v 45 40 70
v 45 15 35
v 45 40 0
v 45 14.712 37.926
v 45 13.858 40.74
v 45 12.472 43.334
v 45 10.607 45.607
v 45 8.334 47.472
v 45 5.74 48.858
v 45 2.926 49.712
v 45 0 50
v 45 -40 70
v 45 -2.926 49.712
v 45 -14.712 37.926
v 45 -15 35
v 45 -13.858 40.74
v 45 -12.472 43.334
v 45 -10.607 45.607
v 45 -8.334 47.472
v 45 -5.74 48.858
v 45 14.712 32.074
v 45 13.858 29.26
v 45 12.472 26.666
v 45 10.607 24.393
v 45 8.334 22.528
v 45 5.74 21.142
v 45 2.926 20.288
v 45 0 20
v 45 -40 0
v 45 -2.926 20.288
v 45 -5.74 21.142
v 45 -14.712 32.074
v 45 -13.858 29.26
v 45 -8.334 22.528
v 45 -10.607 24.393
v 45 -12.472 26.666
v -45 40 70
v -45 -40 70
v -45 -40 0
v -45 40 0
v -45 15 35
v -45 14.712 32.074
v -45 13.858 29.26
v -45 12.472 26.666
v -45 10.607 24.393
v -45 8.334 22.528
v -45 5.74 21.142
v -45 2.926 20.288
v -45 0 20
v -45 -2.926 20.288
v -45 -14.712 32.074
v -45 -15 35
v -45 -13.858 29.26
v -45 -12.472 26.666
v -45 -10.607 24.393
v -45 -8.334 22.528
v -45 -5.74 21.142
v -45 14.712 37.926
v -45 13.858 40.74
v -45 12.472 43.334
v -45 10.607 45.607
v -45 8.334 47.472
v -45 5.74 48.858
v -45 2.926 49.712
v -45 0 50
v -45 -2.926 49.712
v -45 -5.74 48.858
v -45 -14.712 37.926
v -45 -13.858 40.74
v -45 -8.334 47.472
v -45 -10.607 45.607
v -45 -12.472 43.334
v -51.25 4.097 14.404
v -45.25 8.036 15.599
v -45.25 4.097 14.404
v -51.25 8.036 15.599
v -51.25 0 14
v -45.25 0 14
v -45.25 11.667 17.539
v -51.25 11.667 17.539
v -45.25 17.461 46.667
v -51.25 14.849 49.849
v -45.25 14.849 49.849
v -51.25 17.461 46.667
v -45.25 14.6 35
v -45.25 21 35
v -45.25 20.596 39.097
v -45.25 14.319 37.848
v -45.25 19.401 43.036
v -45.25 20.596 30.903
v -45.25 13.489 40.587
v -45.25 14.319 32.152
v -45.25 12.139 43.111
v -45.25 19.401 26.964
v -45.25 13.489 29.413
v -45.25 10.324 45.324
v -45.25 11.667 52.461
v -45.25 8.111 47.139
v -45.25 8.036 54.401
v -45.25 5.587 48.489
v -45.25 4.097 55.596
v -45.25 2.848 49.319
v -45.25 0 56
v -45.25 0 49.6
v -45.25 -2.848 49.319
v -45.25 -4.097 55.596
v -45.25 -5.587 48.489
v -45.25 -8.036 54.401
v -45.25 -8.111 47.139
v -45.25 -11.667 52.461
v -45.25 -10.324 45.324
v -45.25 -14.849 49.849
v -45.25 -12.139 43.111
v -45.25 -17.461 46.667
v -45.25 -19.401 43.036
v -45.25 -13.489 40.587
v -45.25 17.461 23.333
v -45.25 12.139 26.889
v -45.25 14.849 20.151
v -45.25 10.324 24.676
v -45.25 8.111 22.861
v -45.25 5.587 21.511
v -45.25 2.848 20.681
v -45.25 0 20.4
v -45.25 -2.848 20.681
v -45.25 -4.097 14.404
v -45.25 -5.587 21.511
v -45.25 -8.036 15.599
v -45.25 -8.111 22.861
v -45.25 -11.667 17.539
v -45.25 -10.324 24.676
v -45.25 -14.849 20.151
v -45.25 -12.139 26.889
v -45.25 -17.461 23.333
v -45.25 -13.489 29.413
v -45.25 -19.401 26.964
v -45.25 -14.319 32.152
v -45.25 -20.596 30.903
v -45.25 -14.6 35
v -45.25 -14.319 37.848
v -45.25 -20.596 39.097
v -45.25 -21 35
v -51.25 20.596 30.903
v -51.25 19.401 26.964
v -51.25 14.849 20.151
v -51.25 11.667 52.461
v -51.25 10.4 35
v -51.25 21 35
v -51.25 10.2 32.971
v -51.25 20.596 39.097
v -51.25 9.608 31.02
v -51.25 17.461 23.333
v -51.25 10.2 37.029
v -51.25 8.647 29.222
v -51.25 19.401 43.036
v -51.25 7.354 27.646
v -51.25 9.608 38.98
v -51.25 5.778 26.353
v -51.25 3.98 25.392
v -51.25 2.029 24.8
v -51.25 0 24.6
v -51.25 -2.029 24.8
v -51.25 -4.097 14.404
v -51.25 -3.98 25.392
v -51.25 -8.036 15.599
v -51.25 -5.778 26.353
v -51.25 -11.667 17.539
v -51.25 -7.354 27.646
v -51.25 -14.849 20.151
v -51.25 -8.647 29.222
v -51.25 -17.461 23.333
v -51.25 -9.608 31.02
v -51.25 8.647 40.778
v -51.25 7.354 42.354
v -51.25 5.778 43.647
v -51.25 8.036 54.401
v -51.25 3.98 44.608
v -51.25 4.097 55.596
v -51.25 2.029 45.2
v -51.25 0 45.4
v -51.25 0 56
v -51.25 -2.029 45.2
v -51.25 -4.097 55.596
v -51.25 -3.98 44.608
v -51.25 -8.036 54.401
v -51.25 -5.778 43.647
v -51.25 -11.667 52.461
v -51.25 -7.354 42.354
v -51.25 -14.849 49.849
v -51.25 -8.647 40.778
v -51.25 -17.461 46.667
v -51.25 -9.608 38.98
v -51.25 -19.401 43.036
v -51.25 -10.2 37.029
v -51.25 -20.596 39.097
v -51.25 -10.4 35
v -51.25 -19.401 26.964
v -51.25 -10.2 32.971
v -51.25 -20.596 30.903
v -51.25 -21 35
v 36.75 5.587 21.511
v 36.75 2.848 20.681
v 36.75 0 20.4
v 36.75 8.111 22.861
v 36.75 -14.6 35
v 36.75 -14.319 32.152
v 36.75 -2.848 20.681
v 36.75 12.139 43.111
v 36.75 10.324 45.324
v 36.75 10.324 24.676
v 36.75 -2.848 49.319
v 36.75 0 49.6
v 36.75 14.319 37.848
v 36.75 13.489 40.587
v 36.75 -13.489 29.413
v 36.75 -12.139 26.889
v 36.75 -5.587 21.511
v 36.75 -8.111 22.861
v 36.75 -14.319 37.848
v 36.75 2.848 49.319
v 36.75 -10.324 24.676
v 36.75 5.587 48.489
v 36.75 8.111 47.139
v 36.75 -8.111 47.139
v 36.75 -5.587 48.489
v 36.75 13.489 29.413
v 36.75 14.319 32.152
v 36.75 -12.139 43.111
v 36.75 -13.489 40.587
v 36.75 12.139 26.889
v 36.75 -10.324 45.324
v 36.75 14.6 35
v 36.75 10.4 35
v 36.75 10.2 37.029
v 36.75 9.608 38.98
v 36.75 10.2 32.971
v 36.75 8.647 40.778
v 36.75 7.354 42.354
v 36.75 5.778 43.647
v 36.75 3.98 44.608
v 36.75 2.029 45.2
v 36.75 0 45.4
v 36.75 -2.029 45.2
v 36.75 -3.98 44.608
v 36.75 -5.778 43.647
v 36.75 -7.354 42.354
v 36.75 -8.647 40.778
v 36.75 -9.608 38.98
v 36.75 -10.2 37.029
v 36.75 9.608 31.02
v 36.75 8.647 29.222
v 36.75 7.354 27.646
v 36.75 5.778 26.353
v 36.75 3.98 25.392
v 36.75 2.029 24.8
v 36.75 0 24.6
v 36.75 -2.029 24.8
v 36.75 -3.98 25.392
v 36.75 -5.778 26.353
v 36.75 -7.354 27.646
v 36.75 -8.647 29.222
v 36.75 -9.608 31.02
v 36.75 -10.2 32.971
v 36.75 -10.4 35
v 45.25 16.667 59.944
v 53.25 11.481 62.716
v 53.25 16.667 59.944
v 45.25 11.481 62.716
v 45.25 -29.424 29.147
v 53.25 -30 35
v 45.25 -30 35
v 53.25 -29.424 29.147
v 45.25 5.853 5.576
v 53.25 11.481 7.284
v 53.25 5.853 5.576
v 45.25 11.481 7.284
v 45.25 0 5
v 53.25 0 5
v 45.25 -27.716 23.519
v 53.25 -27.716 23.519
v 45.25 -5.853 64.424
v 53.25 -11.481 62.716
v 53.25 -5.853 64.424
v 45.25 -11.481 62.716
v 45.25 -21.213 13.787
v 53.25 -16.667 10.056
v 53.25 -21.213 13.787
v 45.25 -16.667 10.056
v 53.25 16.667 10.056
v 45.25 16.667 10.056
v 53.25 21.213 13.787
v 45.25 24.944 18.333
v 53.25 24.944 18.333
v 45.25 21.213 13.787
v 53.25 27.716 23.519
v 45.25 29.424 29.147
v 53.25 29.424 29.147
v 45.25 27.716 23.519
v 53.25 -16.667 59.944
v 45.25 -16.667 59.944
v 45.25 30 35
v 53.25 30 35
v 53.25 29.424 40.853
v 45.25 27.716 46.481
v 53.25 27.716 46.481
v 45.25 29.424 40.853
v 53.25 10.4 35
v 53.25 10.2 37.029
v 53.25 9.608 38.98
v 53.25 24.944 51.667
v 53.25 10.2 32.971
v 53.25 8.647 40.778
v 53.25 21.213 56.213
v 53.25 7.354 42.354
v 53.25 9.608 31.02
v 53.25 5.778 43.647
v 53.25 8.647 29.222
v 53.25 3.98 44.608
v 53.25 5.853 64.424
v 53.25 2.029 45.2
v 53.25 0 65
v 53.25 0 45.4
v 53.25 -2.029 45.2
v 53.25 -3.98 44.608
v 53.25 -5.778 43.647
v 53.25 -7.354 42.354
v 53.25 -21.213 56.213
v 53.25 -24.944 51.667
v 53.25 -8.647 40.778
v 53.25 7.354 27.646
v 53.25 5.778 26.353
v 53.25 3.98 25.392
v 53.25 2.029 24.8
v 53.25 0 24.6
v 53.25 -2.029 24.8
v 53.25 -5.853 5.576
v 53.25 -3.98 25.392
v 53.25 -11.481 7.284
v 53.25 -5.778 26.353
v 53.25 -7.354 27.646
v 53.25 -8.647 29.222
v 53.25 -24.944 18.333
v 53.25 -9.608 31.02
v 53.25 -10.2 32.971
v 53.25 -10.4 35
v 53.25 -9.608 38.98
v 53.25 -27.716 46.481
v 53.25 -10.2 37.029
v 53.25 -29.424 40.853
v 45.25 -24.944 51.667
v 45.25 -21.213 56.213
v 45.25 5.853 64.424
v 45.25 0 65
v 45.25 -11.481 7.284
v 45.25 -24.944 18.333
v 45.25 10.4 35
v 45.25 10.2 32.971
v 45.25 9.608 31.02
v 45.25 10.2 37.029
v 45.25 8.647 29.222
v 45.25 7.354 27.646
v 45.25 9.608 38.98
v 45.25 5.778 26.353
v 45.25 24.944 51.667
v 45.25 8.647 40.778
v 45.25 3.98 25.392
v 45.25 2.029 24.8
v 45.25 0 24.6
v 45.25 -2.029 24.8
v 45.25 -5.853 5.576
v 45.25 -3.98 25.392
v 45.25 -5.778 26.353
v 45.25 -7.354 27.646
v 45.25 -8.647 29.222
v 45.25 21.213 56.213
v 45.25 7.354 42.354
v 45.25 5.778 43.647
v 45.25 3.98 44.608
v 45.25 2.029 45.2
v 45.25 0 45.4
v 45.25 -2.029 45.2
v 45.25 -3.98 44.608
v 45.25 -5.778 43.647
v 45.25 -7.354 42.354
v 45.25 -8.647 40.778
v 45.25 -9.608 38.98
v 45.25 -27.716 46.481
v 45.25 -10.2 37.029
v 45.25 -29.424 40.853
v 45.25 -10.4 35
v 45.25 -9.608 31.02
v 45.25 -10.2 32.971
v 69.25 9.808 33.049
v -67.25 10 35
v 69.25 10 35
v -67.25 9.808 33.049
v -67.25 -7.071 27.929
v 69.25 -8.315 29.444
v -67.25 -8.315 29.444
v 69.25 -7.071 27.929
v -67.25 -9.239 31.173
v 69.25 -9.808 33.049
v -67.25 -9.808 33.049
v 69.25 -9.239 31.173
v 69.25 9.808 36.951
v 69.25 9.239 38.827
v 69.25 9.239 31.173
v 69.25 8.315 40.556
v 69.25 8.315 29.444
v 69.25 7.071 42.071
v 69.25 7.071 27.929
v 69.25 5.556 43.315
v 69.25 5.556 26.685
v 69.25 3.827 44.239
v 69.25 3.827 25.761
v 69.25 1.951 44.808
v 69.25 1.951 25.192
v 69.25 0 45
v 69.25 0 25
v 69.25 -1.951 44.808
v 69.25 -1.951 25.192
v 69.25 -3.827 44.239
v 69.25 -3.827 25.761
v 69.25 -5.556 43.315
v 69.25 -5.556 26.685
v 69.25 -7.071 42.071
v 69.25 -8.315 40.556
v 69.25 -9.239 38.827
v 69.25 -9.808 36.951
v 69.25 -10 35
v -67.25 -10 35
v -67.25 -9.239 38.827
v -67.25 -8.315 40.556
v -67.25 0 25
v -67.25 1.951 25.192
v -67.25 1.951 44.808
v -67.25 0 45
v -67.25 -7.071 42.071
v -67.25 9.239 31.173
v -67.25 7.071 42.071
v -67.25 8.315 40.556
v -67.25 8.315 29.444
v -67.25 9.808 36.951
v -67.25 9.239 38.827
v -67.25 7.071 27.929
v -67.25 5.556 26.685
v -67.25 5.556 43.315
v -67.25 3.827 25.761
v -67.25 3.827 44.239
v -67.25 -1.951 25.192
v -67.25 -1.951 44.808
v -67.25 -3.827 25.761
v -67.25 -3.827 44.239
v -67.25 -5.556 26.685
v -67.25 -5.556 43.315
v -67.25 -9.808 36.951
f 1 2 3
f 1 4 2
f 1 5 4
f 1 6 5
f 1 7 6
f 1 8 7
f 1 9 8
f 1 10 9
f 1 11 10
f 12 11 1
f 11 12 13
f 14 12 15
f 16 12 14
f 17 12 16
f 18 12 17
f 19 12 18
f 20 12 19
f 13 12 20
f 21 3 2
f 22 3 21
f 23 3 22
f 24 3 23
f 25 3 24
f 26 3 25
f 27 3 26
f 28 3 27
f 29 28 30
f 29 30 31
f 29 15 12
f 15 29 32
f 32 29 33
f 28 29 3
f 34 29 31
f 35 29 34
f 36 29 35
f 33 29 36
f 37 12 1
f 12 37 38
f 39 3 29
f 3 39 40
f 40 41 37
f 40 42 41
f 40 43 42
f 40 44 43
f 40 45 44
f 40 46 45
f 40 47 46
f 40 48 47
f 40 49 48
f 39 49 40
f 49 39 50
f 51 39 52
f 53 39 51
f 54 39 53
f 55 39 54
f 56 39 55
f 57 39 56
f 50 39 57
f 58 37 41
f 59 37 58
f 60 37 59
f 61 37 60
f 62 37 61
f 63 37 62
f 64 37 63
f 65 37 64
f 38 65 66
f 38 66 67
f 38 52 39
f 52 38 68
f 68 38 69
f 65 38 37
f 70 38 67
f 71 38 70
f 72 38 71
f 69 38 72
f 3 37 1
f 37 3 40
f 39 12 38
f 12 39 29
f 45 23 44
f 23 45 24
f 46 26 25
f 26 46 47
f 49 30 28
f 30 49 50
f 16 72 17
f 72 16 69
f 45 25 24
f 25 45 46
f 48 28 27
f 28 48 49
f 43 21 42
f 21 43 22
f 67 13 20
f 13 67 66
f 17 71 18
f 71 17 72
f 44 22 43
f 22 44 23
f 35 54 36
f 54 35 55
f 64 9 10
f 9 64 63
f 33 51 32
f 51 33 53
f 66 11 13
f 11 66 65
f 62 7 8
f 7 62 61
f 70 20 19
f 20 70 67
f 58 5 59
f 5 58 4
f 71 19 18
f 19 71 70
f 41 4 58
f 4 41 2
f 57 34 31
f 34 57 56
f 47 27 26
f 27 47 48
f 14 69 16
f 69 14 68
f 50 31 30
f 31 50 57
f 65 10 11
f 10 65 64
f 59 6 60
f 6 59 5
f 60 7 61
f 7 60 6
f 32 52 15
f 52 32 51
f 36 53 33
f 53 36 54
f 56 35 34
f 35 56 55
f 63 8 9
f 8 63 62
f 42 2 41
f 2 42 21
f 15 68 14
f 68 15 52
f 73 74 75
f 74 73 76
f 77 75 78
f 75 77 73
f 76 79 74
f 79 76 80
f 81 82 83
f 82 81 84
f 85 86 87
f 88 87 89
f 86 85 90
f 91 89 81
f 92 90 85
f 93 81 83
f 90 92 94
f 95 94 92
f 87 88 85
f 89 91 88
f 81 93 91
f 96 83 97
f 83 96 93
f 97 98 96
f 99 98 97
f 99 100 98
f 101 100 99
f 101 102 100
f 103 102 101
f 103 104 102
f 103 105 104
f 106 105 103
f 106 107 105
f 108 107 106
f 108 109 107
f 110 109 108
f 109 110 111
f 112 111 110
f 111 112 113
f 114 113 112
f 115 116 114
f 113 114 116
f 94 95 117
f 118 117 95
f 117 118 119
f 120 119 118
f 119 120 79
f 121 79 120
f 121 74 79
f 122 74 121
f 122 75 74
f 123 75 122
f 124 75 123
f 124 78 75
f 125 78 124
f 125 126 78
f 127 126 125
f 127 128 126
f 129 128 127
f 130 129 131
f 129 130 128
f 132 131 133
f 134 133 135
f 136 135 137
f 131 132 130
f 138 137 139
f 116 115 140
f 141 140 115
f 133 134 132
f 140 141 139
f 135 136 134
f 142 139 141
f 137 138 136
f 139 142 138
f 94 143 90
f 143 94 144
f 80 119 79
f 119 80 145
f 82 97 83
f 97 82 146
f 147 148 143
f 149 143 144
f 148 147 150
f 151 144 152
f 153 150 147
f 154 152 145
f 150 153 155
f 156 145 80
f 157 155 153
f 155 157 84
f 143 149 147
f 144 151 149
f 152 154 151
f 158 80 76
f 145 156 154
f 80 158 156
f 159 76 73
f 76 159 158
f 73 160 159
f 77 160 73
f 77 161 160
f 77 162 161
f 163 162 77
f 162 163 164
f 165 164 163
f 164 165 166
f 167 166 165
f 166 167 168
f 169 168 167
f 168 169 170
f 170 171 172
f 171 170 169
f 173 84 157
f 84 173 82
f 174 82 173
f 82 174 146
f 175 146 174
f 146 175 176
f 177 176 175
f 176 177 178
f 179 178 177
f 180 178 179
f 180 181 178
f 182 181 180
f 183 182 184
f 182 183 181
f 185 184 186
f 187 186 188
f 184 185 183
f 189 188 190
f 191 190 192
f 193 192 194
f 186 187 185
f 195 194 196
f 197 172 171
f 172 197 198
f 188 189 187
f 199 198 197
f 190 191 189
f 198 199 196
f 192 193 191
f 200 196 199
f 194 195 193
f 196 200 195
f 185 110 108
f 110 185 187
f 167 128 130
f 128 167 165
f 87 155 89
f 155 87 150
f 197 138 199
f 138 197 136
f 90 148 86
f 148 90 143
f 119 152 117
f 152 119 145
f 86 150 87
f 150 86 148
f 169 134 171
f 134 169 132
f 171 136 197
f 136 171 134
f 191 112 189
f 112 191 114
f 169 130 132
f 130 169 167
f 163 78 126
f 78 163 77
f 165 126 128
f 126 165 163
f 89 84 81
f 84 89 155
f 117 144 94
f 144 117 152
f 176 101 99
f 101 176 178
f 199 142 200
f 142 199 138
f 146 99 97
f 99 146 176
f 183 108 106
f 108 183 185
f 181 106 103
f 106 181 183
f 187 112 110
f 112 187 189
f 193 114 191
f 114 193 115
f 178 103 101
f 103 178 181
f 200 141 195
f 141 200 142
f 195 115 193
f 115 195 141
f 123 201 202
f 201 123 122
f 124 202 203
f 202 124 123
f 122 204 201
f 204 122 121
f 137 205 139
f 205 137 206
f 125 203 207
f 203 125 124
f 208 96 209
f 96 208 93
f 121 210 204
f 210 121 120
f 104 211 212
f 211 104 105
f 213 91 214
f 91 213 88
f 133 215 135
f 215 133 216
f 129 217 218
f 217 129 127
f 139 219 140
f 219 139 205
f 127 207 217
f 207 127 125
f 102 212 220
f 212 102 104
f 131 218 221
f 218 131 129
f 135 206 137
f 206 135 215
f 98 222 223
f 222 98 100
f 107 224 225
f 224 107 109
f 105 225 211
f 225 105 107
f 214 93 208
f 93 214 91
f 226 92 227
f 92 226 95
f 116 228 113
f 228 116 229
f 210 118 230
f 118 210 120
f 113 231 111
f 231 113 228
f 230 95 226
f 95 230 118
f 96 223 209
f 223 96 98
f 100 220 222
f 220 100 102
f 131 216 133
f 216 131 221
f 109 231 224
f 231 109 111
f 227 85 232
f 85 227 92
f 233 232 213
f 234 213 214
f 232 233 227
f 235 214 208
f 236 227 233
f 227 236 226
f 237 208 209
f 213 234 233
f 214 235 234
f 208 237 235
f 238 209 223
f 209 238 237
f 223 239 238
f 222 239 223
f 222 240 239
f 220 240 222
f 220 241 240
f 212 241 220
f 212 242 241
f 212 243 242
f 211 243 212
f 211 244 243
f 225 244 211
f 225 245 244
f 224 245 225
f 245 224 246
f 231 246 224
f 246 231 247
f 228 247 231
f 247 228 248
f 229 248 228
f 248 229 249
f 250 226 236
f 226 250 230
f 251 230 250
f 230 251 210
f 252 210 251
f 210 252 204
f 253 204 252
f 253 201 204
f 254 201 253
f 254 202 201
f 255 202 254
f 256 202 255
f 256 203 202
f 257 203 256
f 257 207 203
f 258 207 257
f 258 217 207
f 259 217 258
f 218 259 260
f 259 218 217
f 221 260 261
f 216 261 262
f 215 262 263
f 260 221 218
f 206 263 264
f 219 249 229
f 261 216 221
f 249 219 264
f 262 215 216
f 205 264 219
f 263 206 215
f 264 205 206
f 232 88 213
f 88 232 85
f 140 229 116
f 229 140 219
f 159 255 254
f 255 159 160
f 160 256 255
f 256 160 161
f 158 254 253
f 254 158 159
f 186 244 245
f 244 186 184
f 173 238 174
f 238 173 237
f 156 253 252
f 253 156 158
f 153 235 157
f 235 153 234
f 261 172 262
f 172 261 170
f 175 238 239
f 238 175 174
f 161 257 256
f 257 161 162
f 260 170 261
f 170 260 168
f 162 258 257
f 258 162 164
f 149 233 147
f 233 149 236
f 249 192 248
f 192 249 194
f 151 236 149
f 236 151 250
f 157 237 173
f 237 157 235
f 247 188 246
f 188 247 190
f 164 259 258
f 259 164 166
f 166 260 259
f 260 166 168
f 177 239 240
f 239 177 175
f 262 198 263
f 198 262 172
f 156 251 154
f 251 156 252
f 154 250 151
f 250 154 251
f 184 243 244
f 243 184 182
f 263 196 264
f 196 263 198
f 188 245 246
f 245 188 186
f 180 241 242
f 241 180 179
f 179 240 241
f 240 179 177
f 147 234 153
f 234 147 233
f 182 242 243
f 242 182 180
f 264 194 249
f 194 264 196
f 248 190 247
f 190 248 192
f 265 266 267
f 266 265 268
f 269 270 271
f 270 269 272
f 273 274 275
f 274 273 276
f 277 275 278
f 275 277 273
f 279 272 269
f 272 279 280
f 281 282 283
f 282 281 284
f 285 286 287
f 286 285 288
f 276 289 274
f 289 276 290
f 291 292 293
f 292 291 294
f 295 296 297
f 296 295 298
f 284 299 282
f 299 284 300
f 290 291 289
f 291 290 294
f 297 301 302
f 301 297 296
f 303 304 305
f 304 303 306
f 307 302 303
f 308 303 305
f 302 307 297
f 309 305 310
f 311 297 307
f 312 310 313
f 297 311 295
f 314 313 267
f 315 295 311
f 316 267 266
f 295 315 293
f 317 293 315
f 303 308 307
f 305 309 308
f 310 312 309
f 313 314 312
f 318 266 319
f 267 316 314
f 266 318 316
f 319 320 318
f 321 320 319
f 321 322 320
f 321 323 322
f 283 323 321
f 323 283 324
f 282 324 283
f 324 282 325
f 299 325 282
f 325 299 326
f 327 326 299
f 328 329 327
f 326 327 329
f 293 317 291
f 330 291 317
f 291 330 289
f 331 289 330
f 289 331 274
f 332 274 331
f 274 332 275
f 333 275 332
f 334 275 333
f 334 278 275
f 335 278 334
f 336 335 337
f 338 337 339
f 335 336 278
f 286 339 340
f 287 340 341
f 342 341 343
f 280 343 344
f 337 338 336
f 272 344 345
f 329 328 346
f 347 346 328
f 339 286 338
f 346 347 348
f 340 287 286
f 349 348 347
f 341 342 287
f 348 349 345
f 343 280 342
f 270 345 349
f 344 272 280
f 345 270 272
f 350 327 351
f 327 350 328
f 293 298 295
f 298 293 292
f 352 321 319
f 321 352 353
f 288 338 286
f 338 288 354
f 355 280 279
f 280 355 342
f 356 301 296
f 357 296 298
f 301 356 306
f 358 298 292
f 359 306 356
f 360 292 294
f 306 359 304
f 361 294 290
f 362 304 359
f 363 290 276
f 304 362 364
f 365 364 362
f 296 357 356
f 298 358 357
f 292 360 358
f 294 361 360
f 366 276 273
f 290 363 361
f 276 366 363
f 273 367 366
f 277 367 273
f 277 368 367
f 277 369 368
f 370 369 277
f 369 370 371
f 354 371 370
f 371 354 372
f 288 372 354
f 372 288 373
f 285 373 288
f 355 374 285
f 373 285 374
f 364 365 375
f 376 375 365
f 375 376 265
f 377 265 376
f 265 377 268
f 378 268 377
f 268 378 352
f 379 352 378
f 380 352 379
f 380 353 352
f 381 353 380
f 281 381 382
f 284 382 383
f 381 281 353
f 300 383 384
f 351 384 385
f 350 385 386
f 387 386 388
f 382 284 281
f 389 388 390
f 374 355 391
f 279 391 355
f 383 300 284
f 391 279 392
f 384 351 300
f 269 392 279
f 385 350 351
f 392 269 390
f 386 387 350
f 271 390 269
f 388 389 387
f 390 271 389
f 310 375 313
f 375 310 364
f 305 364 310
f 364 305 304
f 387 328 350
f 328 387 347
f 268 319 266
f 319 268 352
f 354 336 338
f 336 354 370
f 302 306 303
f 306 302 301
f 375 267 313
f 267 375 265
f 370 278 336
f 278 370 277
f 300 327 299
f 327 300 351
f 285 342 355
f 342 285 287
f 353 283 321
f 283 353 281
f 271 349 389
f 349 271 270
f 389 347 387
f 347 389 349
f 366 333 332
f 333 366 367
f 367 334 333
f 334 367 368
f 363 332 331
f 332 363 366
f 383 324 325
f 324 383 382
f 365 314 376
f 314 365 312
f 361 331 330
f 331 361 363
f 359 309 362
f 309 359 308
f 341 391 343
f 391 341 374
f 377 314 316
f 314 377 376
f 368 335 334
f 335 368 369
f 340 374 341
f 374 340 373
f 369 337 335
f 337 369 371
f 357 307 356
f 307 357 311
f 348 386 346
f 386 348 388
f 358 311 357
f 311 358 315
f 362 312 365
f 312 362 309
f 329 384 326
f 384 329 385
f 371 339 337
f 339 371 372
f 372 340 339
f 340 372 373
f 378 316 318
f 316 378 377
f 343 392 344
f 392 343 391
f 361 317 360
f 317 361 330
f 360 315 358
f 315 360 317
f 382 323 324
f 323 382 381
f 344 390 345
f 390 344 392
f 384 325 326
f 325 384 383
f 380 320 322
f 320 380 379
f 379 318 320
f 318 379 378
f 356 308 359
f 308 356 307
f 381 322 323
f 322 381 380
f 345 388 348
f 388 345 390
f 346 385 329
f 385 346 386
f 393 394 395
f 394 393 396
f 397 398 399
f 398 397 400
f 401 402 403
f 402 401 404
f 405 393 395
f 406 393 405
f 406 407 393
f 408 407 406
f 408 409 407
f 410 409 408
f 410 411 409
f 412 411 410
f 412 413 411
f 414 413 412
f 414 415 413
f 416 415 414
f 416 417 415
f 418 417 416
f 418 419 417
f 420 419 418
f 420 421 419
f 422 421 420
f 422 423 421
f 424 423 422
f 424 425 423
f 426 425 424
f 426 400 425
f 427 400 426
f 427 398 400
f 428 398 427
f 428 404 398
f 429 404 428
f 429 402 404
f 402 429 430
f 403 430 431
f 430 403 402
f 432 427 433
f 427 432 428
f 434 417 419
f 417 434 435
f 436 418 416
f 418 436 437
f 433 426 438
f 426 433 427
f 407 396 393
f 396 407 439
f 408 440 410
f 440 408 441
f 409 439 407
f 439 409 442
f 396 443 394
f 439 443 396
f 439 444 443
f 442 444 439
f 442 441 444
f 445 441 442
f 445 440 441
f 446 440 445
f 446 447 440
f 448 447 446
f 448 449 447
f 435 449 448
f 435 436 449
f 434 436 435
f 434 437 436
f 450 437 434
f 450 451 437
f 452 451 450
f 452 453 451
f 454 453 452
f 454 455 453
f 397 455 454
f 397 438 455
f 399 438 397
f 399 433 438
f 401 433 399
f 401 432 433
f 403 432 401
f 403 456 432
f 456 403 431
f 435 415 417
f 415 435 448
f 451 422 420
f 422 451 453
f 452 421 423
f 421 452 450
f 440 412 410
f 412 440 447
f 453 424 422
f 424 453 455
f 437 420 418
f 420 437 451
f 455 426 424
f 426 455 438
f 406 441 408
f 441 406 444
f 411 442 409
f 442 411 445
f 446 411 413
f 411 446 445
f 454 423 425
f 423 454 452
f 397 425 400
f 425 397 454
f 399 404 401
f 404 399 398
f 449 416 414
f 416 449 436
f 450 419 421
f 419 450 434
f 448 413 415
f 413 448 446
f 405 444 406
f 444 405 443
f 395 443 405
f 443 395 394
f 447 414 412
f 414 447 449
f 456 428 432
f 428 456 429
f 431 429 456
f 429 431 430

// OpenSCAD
$fn = 32;

// ------------------------------------------------------------------------
// Bushed housing: 90 x 80 x 70 mm housing, bushing d29.2
// Every part is its own module, assembly() places them once.
// ------------------------------------------------------------------------

// --- part 1 ---
module housing() {
  difference() {
    translate([-45, -40, 0]) cube([90, 80, 70]);
    translate([0, 0, 35]) rotate([0, 90, 0]) cylinder(h = 92, d = 30, center = true);
  }
}

// --- part 2 ---
module bushing() {
  difference() {
    union() {
      cylinder(h = 6, d = 42);
      translate([0, 0, 6]) cylinder(h = 82, d = 29.2);
    }
    translate([0, 0, -1]) cylinder(h = 90, d = 20.8);
  }
}

// --- part 3 ---
module shaft() {
  translate([0, 0, -68.25]) cylinder(h = 136.5, d = 20);
}

// --- part 4 ---
module cover() {
  difference() {
    cylinder(h = 8, d = 60);
    translate([0, 0, -1]) cylinder(h = 10, d = 20.8);
  }
}

// --- assembly ---
module assembly() {
  translate([0, 0, 0]) rotate([0, 0, 0]) housing();
  translate([-51.25, 0, 35]) rotate([0, 90, 0]) bushing();
  translate([1, 0, 35]) rotate([0, 90, 0]) shaft();
  translate([45.25, 0, 35]) rotate([0, 90, 0]) cover();
}

assembly();
